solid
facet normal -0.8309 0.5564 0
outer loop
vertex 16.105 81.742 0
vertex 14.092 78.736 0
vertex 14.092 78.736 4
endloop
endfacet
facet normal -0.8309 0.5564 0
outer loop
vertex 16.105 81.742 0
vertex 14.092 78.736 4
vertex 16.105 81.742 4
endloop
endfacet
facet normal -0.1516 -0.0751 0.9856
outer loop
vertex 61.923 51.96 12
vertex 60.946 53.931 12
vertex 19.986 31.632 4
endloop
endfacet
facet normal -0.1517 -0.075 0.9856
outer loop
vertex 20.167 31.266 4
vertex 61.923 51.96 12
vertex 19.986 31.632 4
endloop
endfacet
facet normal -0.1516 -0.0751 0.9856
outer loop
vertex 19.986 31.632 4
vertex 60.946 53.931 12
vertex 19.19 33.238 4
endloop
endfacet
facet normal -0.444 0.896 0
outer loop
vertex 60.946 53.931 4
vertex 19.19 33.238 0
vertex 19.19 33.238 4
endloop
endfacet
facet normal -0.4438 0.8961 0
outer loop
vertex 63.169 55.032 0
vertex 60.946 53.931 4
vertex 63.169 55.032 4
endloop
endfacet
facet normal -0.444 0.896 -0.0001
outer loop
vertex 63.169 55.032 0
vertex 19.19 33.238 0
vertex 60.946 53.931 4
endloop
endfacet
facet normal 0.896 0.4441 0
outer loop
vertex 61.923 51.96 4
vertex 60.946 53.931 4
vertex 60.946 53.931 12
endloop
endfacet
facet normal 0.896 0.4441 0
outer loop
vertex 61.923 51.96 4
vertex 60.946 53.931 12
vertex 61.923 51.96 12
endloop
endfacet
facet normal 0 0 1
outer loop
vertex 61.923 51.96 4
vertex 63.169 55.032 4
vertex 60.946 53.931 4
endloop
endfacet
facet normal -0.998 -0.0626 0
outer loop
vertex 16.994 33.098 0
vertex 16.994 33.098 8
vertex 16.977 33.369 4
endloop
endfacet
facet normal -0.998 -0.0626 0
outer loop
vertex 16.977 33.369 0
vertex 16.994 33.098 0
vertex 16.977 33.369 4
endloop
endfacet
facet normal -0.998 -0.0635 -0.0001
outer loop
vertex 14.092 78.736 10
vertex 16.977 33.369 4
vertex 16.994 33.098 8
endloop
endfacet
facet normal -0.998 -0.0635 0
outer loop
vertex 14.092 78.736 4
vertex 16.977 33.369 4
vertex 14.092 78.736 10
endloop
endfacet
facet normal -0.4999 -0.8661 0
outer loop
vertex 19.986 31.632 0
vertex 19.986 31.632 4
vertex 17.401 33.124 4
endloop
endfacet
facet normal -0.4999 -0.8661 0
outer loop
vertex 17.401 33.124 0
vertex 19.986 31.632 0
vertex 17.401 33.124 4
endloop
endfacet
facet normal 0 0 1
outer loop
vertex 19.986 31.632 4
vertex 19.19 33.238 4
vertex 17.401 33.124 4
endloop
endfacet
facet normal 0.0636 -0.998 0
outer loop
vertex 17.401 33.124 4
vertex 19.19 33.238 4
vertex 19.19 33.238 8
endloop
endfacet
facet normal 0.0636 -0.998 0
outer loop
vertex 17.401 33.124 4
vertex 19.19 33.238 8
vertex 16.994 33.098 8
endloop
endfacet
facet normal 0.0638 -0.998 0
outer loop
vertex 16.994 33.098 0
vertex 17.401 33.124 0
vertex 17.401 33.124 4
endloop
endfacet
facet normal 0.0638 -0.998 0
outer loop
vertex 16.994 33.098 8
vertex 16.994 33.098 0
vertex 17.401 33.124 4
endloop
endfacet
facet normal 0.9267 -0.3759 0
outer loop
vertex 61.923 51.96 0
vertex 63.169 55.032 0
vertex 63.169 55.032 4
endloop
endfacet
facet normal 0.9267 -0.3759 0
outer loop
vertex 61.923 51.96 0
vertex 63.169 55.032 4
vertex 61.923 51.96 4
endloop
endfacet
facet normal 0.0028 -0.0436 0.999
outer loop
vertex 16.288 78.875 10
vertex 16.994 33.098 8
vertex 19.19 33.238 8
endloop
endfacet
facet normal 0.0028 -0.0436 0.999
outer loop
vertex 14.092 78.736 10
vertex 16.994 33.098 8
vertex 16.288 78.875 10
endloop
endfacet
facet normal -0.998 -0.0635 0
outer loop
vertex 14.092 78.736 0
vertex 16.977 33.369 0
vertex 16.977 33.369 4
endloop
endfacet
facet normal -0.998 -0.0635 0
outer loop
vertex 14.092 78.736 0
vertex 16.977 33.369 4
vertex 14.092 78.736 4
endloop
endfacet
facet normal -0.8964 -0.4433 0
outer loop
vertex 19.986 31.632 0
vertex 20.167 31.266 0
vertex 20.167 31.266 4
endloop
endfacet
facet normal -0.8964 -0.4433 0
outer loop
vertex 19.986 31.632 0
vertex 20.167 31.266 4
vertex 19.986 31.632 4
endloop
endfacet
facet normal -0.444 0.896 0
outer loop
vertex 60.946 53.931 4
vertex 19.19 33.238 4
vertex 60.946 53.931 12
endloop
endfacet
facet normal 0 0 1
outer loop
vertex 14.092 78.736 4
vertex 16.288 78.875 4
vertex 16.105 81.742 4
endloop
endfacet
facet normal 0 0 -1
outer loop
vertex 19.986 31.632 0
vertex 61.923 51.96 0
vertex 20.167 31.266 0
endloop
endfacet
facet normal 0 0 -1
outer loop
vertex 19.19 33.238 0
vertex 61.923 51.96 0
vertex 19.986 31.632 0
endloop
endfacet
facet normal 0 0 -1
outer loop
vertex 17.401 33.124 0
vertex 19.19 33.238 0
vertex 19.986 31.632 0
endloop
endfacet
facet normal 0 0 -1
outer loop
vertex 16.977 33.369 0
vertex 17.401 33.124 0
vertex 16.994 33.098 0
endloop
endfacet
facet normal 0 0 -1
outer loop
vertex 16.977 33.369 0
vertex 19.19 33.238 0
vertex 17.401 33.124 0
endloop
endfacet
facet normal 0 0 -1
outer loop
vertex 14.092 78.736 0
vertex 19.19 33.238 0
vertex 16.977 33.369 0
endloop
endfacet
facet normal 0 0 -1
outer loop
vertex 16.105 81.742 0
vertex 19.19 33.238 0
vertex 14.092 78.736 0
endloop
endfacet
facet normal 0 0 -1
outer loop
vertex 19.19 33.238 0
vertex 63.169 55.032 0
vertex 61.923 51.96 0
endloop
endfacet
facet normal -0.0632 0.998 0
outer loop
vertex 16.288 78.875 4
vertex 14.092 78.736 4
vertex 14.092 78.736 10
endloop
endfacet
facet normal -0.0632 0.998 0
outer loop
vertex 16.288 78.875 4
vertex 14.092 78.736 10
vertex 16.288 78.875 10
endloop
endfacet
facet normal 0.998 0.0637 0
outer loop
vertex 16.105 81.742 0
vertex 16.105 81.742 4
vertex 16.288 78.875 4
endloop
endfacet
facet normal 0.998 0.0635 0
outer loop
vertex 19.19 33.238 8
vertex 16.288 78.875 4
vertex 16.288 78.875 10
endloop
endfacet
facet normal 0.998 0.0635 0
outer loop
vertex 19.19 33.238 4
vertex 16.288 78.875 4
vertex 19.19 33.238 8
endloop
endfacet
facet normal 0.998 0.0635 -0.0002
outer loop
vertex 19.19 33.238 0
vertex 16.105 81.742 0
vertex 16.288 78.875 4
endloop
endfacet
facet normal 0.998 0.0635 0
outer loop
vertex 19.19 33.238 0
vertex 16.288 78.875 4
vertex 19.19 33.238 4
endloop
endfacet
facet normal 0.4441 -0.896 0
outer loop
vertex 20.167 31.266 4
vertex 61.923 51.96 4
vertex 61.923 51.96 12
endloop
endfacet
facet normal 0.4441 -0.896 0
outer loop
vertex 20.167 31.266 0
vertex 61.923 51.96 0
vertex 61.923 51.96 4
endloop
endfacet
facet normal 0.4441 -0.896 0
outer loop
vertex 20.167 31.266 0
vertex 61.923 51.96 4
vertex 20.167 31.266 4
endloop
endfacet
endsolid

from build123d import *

# Parameters (mm, degrees)
PAD001_DEPTH    = 4
PAD_DEPTH       = 12
POCKET_DEPTH    = 5
PAD002_DEPTH    = 10
POCKET001_DEPTH = 5


with BuildPart() as part:
    # Sketch → Pad001 (new body)
    with BuildSketch(Plane.XY):
        Polygon((19.1896980533, 33.2375320102), (63.1687295291, 55.0322820836), (61.9231008029, 51.9596510451), (20.4096030829, 31.3867489797), (16.9769204172, 33.3686092408), (14.0922142472, 78.735746785), (16.1054778399, 81.7423829), align=None)
    extrude(amount=PAD001_DEPTH)

    # Sketch001 → Pad (join)
    with BuildSketch(Plane.XY):
        Polygon((19.1896980533, 33.2375320102), (60.9462208875, 53.930870371), (61.9231008029, 51.9596510451), (20.1665779687, 31.2663126843), align=None)
    extrude(amount=PAD_DEPTH)

    # Sketch003 (on Face10 of Pad) → Pocket (cut)
    with BuildSketch(Plane(origin=(-9.4403000379, 19.049323856, 0), x_dir=(-0.8960087845, -0.4440363252, 0), z_dir=(-0.4440363252, 0.8960087845, 0))):
        Polygon((-78.5556147914, 12), (-31.9528096, 4), (-31.9528096, 12), align=None)
    extrude(amount=-POCKET_DEPTH, mode=Mode.SUBTRACT)

    # Sketch004 → Pad002 (join)
    with BuildSketch(Plane.XY):
        Polygon((16.2877802175, 78.8753536248), (19.1896980533, 33.2375320102), (16.9941320829, 33.0979251705), (14.0922142472, 78.735746785), align=None)
    extrude(amount=PAD002_DEPTH)

    # Sketch005 (on Face2 of Pad002) → Pocket001 (cut)
    with BuildSketch(Plane(origin=(19.0217824328, 1.209515436, 0), x_dir=(0.0634576544, -0.997984532, 0), z_dir=(-0.997984532, -0.0634576544, 0))):
        Polygon((-31.9528096, 10), (-31.9528096, 8), (-77.6827985443, 10), align=None)
    extrude(amount=-POCKET001_DEPTH, mode=Mode.SUBTRACT)


solid = part.part
